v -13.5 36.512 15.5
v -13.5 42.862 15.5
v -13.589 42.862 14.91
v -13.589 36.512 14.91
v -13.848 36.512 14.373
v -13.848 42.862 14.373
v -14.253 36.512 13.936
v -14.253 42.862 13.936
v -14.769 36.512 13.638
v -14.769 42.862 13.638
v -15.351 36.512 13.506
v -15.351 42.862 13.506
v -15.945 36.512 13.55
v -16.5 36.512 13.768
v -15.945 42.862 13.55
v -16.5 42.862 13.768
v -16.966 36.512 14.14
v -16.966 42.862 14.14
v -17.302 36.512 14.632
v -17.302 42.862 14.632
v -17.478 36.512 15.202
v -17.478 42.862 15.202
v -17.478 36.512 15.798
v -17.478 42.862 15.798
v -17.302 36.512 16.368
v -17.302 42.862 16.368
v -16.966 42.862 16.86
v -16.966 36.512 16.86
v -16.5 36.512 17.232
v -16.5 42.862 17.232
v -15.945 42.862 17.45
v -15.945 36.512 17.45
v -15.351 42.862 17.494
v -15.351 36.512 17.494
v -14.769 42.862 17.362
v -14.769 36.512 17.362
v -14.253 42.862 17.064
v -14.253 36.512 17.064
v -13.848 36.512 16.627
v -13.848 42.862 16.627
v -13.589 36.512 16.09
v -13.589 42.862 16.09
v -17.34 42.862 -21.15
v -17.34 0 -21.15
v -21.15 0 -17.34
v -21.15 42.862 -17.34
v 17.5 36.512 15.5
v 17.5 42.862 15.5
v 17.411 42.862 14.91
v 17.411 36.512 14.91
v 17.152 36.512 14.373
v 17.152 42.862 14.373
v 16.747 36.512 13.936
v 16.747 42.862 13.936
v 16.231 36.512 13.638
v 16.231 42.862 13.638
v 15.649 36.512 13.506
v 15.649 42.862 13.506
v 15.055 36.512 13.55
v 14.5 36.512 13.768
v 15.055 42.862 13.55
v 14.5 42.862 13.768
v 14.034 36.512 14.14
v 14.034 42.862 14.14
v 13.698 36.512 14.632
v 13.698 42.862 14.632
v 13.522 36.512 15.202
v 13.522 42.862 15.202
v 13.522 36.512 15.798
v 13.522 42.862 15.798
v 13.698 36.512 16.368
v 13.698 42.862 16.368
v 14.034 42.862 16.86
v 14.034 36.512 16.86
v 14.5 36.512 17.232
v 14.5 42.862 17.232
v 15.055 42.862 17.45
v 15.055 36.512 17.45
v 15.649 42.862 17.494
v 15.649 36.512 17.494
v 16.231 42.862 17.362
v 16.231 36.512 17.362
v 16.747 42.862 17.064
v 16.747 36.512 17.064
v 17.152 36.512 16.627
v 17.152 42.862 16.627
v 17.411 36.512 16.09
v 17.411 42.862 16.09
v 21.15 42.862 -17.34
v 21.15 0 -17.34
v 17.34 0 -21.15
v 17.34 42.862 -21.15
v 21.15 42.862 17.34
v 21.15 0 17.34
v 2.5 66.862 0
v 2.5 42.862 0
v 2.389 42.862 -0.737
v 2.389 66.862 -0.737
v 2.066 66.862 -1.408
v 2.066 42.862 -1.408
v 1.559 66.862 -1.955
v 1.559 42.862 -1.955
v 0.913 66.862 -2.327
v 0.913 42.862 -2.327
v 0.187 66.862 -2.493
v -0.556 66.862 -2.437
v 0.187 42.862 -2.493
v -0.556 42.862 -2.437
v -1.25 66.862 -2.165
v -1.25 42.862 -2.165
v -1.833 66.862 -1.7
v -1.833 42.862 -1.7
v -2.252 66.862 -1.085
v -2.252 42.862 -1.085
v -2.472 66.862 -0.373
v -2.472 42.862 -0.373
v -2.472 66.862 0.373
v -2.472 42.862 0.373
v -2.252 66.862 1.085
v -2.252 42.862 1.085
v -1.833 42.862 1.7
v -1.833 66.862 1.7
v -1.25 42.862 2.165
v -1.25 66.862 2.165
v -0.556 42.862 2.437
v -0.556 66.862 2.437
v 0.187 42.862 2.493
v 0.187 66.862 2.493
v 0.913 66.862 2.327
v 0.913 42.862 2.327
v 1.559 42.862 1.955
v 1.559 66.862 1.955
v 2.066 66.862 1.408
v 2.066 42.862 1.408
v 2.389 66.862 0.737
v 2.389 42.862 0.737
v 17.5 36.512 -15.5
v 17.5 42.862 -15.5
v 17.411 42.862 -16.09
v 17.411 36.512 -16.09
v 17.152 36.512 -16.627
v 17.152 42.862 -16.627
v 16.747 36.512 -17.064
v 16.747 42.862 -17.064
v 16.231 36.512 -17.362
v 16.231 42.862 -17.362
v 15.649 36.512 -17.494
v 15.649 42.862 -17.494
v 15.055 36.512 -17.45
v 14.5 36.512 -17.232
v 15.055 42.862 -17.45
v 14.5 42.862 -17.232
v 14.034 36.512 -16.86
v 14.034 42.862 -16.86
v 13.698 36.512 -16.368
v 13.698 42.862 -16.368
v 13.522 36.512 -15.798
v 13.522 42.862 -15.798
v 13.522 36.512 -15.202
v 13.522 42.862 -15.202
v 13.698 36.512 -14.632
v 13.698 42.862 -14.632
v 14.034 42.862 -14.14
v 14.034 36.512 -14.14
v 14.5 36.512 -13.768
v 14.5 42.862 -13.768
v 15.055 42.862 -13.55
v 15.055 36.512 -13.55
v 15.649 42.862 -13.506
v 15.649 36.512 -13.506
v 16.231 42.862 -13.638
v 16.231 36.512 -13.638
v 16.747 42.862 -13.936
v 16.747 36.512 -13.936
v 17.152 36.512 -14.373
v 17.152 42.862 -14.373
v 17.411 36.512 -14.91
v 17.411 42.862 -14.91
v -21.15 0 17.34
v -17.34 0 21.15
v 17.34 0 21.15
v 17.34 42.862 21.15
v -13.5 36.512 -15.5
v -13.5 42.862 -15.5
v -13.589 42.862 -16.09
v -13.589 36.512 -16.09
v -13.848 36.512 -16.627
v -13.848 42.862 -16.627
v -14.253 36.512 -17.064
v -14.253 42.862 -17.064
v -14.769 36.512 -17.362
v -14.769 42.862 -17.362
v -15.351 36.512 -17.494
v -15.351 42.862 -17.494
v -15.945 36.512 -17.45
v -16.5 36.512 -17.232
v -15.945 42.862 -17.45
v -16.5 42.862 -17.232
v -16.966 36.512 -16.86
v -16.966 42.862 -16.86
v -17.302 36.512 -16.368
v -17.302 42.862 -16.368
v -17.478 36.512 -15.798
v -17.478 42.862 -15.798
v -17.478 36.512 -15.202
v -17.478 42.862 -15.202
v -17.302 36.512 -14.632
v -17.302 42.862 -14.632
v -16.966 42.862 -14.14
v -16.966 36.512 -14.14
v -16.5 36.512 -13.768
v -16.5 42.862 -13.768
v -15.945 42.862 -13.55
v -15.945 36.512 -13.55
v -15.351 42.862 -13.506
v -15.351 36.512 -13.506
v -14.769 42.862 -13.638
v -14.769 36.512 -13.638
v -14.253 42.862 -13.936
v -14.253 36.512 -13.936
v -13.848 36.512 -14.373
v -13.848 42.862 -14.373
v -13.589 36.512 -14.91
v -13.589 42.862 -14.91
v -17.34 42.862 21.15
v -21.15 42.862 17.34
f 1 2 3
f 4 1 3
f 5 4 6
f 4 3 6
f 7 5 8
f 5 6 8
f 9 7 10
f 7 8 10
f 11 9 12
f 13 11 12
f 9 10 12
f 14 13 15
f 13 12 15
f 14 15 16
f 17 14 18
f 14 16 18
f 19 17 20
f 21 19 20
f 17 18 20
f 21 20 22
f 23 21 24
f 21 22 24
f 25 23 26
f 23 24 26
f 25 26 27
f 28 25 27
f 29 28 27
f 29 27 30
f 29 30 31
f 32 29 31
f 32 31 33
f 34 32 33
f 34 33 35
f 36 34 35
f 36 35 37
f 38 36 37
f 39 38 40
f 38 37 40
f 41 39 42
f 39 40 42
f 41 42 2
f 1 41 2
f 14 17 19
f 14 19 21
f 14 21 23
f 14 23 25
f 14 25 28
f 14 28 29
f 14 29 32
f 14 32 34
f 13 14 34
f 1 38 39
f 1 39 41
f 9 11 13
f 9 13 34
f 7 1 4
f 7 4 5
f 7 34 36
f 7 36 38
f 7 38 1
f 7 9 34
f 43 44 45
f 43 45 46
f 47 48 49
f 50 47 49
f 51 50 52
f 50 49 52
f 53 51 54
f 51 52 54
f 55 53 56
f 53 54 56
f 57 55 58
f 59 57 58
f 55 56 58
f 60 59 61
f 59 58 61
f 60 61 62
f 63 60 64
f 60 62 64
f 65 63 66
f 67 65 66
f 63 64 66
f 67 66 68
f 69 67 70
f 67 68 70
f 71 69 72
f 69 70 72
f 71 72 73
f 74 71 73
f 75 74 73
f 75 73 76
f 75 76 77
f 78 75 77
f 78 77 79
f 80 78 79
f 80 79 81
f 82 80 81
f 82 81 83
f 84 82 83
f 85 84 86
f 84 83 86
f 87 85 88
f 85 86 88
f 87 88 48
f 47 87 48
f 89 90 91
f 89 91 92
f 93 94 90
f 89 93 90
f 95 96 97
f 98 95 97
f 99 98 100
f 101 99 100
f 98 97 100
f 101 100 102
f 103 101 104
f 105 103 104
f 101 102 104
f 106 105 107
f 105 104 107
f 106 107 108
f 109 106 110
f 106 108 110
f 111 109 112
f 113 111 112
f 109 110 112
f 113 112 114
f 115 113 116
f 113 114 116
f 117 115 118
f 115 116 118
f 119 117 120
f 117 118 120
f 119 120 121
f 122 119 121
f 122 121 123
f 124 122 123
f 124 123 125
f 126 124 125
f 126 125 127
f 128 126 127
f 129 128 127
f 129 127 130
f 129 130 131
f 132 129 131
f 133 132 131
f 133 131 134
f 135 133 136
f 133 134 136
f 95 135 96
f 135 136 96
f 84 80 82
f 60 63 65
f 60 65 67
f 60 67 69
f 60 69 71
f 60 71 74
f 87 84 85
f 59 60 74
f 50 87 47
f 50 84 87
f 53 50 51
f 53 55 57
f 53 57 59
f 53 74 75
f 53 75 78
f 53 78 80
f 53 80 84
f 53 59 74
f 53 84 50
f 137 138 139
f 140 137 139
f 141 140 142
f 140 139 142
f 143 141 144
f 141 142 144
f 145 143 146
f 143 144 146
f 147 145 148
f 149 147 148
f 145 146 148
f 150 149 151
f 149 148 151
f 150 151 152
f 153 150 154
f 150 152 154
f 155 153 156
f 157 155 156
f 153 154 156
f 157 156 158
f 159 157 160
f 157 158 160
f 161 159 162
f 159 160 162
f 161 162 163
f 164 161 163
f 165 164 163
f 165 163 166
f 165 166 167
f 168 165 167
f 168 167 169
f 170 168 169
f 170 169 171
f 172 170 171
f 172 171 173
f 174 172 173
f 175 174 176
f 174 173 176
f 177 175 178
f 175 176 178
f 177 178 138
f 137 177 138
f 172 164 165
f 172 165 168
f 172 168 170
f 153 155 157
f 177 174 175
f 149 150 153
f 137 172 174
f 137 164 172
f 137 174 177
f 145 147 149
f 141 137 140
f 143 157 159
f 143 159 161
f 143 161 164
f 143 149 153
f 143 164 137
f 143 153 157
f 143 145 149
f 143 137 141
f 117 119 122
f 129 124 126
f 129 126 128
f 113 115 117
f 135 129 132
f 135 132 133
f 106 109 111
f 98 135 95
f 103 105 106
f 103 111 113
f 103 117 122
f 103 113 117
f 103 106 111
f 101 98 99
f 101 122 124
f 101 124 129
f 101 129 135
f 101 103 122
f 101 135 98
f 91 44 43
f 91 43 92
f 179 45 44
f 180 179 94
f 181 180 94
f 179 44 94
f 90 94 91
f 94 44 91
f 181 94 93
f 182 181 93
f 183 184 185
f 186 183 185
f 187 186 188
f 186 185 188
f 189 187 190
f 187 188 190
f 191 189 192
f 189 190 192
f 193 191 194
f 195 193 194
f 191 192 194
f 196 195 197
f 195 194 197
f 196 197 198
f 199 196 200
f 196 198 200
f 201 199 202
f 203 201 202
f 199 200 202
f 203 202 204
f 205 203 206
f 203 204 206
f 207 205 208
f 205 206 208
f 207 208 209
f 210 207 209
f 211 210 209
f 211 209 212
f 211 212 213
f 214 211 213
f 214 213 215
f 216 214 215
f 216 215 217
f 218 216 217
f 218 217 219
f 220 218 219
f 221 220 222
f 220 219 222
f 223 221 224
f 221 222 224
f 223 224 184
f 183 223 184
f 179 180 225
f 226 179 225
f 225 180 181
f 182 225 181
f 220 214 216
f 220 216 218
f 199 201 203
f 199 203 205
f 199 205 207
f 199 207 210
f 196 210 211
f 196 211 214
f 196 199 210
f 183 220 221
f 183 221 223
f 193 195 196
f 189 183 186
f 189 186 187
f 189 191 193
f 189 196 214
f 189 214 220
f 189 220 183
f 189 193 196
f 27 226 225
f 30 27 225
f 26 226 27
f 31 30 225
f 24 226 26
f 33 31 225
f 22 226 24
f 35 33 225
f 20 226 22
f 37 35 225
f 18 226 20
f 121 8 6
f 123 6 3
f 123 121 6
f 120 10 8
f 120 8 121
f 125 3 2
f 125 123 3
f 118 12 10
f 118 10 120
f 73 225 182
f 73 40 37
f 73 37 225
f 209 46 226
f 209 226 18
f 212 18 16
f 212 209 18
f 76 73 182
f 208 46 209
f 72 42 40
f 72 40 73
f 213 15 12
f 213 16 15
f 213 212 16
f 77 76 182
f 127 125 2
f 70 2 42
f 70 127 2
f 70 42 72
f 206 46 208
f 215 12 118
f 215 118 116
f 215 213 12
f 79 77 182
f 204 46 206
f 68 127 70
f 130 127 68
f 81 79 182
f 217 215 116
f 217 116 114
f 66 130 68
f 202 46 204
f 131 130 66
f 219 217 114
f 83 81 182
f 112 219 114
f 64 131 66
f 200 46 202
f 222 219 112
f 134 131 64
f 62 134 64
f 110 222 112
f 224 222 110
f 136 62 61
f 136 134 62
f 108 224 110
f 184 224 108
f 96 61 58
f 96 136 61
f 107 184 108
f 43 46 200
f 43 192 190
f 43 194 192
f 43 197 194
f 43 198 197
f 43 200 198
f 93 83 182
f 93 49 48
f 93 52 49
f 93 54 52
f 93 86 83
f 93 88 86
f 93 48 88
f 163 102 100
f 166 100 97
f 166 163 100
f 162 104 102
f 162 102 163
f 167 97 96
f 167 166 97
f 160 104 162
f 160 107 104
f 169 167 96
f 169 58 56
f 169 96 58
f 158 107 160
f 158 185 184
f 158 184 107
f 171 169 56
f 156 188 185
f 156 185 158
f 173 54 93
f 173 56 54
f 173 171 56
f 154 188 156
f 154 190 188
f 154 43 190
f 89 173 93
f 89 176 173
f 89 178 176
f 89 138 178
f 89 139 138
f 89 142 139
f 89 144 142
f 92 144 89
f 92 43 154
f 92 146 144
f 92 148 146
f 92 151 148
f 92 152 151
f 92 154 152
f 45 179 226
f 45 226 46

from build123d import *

# Parameters (mm, degrees)
SKETCH1_W           = 42.299999982
SKETCH1_H           = 42.299999982
BOSS_EXTRUDE1_DEPTH = 42.8625
SKETCH2_R           = 2
CUT_EXTRUDE1_DEPTH  = 6.35
CHAMFER1_SIZE       = 3.81
SKETCH3_R           = 2.5
BOSS_EXTRUDE2_DEPTH = 24


with BuildPart() as part:
    # Sketch1 → Boss-Extrude1 (new body)
    with BuildSketch(Plane(origin=(0, 0, 0), x_dir=(1, 0, 0), z_dir=(0, 1, 0))):
        Rectangle(SKETCH1_W, SKETCH1_H)
    extrude(amount=BOSS_EXTRUDE1_DEPTH)

    # Sketch2 → Cut-Extrude1 (cut)
    with BuildSketch(Plane(origin=(0, 42.8625, 0), x_dir=(1, 0, 0), z_dir=(0, 1, 0))):
        with Locations((-15.499999988, -15.499999988)):
            Circle(SKETCH2_R)
        with Locations((-15.499999988, 15.499999988)):
            Circle(SKETCH2_R)
        with Locations((15.499999988, 15.499999988)):
            Circle(SKETCH2_R)
        with Locations((15.499999988, -15.499999988)):
            Circle(SKETCH2_R)
    extrude(amount=-CUT_EXTRUDE1_DEPTH, mode=Mode.SUBTRACT)

    # Chamfer1
    chamfer1_edges = [part.edges().sort_by_distance(p)[0] for p in [
        (-21.149999991, 21.43125, -21.149999991),
        (21.149999991, 21.43125, -21.149999991),
        (21.149999991, 21.43125, 21.149999991),
        (-21.149999991, 21.43125, 21.149999991),
    ]]
    chamfer(chamfer1_edges, length=CHAMFER1_SIZE)

    # Sketch3 → Boss-Extrude2 (add)
    with BuildSketch(Plane(origin=(0, 42.8625, 0), x_dir=(1, 0, 0), z_dir=(0, 1, 0))):
        Circle(SKETCH3_R)
    extrude(amount=BOSS_EXTRUDE2_DEPTH)


solid = part.part
